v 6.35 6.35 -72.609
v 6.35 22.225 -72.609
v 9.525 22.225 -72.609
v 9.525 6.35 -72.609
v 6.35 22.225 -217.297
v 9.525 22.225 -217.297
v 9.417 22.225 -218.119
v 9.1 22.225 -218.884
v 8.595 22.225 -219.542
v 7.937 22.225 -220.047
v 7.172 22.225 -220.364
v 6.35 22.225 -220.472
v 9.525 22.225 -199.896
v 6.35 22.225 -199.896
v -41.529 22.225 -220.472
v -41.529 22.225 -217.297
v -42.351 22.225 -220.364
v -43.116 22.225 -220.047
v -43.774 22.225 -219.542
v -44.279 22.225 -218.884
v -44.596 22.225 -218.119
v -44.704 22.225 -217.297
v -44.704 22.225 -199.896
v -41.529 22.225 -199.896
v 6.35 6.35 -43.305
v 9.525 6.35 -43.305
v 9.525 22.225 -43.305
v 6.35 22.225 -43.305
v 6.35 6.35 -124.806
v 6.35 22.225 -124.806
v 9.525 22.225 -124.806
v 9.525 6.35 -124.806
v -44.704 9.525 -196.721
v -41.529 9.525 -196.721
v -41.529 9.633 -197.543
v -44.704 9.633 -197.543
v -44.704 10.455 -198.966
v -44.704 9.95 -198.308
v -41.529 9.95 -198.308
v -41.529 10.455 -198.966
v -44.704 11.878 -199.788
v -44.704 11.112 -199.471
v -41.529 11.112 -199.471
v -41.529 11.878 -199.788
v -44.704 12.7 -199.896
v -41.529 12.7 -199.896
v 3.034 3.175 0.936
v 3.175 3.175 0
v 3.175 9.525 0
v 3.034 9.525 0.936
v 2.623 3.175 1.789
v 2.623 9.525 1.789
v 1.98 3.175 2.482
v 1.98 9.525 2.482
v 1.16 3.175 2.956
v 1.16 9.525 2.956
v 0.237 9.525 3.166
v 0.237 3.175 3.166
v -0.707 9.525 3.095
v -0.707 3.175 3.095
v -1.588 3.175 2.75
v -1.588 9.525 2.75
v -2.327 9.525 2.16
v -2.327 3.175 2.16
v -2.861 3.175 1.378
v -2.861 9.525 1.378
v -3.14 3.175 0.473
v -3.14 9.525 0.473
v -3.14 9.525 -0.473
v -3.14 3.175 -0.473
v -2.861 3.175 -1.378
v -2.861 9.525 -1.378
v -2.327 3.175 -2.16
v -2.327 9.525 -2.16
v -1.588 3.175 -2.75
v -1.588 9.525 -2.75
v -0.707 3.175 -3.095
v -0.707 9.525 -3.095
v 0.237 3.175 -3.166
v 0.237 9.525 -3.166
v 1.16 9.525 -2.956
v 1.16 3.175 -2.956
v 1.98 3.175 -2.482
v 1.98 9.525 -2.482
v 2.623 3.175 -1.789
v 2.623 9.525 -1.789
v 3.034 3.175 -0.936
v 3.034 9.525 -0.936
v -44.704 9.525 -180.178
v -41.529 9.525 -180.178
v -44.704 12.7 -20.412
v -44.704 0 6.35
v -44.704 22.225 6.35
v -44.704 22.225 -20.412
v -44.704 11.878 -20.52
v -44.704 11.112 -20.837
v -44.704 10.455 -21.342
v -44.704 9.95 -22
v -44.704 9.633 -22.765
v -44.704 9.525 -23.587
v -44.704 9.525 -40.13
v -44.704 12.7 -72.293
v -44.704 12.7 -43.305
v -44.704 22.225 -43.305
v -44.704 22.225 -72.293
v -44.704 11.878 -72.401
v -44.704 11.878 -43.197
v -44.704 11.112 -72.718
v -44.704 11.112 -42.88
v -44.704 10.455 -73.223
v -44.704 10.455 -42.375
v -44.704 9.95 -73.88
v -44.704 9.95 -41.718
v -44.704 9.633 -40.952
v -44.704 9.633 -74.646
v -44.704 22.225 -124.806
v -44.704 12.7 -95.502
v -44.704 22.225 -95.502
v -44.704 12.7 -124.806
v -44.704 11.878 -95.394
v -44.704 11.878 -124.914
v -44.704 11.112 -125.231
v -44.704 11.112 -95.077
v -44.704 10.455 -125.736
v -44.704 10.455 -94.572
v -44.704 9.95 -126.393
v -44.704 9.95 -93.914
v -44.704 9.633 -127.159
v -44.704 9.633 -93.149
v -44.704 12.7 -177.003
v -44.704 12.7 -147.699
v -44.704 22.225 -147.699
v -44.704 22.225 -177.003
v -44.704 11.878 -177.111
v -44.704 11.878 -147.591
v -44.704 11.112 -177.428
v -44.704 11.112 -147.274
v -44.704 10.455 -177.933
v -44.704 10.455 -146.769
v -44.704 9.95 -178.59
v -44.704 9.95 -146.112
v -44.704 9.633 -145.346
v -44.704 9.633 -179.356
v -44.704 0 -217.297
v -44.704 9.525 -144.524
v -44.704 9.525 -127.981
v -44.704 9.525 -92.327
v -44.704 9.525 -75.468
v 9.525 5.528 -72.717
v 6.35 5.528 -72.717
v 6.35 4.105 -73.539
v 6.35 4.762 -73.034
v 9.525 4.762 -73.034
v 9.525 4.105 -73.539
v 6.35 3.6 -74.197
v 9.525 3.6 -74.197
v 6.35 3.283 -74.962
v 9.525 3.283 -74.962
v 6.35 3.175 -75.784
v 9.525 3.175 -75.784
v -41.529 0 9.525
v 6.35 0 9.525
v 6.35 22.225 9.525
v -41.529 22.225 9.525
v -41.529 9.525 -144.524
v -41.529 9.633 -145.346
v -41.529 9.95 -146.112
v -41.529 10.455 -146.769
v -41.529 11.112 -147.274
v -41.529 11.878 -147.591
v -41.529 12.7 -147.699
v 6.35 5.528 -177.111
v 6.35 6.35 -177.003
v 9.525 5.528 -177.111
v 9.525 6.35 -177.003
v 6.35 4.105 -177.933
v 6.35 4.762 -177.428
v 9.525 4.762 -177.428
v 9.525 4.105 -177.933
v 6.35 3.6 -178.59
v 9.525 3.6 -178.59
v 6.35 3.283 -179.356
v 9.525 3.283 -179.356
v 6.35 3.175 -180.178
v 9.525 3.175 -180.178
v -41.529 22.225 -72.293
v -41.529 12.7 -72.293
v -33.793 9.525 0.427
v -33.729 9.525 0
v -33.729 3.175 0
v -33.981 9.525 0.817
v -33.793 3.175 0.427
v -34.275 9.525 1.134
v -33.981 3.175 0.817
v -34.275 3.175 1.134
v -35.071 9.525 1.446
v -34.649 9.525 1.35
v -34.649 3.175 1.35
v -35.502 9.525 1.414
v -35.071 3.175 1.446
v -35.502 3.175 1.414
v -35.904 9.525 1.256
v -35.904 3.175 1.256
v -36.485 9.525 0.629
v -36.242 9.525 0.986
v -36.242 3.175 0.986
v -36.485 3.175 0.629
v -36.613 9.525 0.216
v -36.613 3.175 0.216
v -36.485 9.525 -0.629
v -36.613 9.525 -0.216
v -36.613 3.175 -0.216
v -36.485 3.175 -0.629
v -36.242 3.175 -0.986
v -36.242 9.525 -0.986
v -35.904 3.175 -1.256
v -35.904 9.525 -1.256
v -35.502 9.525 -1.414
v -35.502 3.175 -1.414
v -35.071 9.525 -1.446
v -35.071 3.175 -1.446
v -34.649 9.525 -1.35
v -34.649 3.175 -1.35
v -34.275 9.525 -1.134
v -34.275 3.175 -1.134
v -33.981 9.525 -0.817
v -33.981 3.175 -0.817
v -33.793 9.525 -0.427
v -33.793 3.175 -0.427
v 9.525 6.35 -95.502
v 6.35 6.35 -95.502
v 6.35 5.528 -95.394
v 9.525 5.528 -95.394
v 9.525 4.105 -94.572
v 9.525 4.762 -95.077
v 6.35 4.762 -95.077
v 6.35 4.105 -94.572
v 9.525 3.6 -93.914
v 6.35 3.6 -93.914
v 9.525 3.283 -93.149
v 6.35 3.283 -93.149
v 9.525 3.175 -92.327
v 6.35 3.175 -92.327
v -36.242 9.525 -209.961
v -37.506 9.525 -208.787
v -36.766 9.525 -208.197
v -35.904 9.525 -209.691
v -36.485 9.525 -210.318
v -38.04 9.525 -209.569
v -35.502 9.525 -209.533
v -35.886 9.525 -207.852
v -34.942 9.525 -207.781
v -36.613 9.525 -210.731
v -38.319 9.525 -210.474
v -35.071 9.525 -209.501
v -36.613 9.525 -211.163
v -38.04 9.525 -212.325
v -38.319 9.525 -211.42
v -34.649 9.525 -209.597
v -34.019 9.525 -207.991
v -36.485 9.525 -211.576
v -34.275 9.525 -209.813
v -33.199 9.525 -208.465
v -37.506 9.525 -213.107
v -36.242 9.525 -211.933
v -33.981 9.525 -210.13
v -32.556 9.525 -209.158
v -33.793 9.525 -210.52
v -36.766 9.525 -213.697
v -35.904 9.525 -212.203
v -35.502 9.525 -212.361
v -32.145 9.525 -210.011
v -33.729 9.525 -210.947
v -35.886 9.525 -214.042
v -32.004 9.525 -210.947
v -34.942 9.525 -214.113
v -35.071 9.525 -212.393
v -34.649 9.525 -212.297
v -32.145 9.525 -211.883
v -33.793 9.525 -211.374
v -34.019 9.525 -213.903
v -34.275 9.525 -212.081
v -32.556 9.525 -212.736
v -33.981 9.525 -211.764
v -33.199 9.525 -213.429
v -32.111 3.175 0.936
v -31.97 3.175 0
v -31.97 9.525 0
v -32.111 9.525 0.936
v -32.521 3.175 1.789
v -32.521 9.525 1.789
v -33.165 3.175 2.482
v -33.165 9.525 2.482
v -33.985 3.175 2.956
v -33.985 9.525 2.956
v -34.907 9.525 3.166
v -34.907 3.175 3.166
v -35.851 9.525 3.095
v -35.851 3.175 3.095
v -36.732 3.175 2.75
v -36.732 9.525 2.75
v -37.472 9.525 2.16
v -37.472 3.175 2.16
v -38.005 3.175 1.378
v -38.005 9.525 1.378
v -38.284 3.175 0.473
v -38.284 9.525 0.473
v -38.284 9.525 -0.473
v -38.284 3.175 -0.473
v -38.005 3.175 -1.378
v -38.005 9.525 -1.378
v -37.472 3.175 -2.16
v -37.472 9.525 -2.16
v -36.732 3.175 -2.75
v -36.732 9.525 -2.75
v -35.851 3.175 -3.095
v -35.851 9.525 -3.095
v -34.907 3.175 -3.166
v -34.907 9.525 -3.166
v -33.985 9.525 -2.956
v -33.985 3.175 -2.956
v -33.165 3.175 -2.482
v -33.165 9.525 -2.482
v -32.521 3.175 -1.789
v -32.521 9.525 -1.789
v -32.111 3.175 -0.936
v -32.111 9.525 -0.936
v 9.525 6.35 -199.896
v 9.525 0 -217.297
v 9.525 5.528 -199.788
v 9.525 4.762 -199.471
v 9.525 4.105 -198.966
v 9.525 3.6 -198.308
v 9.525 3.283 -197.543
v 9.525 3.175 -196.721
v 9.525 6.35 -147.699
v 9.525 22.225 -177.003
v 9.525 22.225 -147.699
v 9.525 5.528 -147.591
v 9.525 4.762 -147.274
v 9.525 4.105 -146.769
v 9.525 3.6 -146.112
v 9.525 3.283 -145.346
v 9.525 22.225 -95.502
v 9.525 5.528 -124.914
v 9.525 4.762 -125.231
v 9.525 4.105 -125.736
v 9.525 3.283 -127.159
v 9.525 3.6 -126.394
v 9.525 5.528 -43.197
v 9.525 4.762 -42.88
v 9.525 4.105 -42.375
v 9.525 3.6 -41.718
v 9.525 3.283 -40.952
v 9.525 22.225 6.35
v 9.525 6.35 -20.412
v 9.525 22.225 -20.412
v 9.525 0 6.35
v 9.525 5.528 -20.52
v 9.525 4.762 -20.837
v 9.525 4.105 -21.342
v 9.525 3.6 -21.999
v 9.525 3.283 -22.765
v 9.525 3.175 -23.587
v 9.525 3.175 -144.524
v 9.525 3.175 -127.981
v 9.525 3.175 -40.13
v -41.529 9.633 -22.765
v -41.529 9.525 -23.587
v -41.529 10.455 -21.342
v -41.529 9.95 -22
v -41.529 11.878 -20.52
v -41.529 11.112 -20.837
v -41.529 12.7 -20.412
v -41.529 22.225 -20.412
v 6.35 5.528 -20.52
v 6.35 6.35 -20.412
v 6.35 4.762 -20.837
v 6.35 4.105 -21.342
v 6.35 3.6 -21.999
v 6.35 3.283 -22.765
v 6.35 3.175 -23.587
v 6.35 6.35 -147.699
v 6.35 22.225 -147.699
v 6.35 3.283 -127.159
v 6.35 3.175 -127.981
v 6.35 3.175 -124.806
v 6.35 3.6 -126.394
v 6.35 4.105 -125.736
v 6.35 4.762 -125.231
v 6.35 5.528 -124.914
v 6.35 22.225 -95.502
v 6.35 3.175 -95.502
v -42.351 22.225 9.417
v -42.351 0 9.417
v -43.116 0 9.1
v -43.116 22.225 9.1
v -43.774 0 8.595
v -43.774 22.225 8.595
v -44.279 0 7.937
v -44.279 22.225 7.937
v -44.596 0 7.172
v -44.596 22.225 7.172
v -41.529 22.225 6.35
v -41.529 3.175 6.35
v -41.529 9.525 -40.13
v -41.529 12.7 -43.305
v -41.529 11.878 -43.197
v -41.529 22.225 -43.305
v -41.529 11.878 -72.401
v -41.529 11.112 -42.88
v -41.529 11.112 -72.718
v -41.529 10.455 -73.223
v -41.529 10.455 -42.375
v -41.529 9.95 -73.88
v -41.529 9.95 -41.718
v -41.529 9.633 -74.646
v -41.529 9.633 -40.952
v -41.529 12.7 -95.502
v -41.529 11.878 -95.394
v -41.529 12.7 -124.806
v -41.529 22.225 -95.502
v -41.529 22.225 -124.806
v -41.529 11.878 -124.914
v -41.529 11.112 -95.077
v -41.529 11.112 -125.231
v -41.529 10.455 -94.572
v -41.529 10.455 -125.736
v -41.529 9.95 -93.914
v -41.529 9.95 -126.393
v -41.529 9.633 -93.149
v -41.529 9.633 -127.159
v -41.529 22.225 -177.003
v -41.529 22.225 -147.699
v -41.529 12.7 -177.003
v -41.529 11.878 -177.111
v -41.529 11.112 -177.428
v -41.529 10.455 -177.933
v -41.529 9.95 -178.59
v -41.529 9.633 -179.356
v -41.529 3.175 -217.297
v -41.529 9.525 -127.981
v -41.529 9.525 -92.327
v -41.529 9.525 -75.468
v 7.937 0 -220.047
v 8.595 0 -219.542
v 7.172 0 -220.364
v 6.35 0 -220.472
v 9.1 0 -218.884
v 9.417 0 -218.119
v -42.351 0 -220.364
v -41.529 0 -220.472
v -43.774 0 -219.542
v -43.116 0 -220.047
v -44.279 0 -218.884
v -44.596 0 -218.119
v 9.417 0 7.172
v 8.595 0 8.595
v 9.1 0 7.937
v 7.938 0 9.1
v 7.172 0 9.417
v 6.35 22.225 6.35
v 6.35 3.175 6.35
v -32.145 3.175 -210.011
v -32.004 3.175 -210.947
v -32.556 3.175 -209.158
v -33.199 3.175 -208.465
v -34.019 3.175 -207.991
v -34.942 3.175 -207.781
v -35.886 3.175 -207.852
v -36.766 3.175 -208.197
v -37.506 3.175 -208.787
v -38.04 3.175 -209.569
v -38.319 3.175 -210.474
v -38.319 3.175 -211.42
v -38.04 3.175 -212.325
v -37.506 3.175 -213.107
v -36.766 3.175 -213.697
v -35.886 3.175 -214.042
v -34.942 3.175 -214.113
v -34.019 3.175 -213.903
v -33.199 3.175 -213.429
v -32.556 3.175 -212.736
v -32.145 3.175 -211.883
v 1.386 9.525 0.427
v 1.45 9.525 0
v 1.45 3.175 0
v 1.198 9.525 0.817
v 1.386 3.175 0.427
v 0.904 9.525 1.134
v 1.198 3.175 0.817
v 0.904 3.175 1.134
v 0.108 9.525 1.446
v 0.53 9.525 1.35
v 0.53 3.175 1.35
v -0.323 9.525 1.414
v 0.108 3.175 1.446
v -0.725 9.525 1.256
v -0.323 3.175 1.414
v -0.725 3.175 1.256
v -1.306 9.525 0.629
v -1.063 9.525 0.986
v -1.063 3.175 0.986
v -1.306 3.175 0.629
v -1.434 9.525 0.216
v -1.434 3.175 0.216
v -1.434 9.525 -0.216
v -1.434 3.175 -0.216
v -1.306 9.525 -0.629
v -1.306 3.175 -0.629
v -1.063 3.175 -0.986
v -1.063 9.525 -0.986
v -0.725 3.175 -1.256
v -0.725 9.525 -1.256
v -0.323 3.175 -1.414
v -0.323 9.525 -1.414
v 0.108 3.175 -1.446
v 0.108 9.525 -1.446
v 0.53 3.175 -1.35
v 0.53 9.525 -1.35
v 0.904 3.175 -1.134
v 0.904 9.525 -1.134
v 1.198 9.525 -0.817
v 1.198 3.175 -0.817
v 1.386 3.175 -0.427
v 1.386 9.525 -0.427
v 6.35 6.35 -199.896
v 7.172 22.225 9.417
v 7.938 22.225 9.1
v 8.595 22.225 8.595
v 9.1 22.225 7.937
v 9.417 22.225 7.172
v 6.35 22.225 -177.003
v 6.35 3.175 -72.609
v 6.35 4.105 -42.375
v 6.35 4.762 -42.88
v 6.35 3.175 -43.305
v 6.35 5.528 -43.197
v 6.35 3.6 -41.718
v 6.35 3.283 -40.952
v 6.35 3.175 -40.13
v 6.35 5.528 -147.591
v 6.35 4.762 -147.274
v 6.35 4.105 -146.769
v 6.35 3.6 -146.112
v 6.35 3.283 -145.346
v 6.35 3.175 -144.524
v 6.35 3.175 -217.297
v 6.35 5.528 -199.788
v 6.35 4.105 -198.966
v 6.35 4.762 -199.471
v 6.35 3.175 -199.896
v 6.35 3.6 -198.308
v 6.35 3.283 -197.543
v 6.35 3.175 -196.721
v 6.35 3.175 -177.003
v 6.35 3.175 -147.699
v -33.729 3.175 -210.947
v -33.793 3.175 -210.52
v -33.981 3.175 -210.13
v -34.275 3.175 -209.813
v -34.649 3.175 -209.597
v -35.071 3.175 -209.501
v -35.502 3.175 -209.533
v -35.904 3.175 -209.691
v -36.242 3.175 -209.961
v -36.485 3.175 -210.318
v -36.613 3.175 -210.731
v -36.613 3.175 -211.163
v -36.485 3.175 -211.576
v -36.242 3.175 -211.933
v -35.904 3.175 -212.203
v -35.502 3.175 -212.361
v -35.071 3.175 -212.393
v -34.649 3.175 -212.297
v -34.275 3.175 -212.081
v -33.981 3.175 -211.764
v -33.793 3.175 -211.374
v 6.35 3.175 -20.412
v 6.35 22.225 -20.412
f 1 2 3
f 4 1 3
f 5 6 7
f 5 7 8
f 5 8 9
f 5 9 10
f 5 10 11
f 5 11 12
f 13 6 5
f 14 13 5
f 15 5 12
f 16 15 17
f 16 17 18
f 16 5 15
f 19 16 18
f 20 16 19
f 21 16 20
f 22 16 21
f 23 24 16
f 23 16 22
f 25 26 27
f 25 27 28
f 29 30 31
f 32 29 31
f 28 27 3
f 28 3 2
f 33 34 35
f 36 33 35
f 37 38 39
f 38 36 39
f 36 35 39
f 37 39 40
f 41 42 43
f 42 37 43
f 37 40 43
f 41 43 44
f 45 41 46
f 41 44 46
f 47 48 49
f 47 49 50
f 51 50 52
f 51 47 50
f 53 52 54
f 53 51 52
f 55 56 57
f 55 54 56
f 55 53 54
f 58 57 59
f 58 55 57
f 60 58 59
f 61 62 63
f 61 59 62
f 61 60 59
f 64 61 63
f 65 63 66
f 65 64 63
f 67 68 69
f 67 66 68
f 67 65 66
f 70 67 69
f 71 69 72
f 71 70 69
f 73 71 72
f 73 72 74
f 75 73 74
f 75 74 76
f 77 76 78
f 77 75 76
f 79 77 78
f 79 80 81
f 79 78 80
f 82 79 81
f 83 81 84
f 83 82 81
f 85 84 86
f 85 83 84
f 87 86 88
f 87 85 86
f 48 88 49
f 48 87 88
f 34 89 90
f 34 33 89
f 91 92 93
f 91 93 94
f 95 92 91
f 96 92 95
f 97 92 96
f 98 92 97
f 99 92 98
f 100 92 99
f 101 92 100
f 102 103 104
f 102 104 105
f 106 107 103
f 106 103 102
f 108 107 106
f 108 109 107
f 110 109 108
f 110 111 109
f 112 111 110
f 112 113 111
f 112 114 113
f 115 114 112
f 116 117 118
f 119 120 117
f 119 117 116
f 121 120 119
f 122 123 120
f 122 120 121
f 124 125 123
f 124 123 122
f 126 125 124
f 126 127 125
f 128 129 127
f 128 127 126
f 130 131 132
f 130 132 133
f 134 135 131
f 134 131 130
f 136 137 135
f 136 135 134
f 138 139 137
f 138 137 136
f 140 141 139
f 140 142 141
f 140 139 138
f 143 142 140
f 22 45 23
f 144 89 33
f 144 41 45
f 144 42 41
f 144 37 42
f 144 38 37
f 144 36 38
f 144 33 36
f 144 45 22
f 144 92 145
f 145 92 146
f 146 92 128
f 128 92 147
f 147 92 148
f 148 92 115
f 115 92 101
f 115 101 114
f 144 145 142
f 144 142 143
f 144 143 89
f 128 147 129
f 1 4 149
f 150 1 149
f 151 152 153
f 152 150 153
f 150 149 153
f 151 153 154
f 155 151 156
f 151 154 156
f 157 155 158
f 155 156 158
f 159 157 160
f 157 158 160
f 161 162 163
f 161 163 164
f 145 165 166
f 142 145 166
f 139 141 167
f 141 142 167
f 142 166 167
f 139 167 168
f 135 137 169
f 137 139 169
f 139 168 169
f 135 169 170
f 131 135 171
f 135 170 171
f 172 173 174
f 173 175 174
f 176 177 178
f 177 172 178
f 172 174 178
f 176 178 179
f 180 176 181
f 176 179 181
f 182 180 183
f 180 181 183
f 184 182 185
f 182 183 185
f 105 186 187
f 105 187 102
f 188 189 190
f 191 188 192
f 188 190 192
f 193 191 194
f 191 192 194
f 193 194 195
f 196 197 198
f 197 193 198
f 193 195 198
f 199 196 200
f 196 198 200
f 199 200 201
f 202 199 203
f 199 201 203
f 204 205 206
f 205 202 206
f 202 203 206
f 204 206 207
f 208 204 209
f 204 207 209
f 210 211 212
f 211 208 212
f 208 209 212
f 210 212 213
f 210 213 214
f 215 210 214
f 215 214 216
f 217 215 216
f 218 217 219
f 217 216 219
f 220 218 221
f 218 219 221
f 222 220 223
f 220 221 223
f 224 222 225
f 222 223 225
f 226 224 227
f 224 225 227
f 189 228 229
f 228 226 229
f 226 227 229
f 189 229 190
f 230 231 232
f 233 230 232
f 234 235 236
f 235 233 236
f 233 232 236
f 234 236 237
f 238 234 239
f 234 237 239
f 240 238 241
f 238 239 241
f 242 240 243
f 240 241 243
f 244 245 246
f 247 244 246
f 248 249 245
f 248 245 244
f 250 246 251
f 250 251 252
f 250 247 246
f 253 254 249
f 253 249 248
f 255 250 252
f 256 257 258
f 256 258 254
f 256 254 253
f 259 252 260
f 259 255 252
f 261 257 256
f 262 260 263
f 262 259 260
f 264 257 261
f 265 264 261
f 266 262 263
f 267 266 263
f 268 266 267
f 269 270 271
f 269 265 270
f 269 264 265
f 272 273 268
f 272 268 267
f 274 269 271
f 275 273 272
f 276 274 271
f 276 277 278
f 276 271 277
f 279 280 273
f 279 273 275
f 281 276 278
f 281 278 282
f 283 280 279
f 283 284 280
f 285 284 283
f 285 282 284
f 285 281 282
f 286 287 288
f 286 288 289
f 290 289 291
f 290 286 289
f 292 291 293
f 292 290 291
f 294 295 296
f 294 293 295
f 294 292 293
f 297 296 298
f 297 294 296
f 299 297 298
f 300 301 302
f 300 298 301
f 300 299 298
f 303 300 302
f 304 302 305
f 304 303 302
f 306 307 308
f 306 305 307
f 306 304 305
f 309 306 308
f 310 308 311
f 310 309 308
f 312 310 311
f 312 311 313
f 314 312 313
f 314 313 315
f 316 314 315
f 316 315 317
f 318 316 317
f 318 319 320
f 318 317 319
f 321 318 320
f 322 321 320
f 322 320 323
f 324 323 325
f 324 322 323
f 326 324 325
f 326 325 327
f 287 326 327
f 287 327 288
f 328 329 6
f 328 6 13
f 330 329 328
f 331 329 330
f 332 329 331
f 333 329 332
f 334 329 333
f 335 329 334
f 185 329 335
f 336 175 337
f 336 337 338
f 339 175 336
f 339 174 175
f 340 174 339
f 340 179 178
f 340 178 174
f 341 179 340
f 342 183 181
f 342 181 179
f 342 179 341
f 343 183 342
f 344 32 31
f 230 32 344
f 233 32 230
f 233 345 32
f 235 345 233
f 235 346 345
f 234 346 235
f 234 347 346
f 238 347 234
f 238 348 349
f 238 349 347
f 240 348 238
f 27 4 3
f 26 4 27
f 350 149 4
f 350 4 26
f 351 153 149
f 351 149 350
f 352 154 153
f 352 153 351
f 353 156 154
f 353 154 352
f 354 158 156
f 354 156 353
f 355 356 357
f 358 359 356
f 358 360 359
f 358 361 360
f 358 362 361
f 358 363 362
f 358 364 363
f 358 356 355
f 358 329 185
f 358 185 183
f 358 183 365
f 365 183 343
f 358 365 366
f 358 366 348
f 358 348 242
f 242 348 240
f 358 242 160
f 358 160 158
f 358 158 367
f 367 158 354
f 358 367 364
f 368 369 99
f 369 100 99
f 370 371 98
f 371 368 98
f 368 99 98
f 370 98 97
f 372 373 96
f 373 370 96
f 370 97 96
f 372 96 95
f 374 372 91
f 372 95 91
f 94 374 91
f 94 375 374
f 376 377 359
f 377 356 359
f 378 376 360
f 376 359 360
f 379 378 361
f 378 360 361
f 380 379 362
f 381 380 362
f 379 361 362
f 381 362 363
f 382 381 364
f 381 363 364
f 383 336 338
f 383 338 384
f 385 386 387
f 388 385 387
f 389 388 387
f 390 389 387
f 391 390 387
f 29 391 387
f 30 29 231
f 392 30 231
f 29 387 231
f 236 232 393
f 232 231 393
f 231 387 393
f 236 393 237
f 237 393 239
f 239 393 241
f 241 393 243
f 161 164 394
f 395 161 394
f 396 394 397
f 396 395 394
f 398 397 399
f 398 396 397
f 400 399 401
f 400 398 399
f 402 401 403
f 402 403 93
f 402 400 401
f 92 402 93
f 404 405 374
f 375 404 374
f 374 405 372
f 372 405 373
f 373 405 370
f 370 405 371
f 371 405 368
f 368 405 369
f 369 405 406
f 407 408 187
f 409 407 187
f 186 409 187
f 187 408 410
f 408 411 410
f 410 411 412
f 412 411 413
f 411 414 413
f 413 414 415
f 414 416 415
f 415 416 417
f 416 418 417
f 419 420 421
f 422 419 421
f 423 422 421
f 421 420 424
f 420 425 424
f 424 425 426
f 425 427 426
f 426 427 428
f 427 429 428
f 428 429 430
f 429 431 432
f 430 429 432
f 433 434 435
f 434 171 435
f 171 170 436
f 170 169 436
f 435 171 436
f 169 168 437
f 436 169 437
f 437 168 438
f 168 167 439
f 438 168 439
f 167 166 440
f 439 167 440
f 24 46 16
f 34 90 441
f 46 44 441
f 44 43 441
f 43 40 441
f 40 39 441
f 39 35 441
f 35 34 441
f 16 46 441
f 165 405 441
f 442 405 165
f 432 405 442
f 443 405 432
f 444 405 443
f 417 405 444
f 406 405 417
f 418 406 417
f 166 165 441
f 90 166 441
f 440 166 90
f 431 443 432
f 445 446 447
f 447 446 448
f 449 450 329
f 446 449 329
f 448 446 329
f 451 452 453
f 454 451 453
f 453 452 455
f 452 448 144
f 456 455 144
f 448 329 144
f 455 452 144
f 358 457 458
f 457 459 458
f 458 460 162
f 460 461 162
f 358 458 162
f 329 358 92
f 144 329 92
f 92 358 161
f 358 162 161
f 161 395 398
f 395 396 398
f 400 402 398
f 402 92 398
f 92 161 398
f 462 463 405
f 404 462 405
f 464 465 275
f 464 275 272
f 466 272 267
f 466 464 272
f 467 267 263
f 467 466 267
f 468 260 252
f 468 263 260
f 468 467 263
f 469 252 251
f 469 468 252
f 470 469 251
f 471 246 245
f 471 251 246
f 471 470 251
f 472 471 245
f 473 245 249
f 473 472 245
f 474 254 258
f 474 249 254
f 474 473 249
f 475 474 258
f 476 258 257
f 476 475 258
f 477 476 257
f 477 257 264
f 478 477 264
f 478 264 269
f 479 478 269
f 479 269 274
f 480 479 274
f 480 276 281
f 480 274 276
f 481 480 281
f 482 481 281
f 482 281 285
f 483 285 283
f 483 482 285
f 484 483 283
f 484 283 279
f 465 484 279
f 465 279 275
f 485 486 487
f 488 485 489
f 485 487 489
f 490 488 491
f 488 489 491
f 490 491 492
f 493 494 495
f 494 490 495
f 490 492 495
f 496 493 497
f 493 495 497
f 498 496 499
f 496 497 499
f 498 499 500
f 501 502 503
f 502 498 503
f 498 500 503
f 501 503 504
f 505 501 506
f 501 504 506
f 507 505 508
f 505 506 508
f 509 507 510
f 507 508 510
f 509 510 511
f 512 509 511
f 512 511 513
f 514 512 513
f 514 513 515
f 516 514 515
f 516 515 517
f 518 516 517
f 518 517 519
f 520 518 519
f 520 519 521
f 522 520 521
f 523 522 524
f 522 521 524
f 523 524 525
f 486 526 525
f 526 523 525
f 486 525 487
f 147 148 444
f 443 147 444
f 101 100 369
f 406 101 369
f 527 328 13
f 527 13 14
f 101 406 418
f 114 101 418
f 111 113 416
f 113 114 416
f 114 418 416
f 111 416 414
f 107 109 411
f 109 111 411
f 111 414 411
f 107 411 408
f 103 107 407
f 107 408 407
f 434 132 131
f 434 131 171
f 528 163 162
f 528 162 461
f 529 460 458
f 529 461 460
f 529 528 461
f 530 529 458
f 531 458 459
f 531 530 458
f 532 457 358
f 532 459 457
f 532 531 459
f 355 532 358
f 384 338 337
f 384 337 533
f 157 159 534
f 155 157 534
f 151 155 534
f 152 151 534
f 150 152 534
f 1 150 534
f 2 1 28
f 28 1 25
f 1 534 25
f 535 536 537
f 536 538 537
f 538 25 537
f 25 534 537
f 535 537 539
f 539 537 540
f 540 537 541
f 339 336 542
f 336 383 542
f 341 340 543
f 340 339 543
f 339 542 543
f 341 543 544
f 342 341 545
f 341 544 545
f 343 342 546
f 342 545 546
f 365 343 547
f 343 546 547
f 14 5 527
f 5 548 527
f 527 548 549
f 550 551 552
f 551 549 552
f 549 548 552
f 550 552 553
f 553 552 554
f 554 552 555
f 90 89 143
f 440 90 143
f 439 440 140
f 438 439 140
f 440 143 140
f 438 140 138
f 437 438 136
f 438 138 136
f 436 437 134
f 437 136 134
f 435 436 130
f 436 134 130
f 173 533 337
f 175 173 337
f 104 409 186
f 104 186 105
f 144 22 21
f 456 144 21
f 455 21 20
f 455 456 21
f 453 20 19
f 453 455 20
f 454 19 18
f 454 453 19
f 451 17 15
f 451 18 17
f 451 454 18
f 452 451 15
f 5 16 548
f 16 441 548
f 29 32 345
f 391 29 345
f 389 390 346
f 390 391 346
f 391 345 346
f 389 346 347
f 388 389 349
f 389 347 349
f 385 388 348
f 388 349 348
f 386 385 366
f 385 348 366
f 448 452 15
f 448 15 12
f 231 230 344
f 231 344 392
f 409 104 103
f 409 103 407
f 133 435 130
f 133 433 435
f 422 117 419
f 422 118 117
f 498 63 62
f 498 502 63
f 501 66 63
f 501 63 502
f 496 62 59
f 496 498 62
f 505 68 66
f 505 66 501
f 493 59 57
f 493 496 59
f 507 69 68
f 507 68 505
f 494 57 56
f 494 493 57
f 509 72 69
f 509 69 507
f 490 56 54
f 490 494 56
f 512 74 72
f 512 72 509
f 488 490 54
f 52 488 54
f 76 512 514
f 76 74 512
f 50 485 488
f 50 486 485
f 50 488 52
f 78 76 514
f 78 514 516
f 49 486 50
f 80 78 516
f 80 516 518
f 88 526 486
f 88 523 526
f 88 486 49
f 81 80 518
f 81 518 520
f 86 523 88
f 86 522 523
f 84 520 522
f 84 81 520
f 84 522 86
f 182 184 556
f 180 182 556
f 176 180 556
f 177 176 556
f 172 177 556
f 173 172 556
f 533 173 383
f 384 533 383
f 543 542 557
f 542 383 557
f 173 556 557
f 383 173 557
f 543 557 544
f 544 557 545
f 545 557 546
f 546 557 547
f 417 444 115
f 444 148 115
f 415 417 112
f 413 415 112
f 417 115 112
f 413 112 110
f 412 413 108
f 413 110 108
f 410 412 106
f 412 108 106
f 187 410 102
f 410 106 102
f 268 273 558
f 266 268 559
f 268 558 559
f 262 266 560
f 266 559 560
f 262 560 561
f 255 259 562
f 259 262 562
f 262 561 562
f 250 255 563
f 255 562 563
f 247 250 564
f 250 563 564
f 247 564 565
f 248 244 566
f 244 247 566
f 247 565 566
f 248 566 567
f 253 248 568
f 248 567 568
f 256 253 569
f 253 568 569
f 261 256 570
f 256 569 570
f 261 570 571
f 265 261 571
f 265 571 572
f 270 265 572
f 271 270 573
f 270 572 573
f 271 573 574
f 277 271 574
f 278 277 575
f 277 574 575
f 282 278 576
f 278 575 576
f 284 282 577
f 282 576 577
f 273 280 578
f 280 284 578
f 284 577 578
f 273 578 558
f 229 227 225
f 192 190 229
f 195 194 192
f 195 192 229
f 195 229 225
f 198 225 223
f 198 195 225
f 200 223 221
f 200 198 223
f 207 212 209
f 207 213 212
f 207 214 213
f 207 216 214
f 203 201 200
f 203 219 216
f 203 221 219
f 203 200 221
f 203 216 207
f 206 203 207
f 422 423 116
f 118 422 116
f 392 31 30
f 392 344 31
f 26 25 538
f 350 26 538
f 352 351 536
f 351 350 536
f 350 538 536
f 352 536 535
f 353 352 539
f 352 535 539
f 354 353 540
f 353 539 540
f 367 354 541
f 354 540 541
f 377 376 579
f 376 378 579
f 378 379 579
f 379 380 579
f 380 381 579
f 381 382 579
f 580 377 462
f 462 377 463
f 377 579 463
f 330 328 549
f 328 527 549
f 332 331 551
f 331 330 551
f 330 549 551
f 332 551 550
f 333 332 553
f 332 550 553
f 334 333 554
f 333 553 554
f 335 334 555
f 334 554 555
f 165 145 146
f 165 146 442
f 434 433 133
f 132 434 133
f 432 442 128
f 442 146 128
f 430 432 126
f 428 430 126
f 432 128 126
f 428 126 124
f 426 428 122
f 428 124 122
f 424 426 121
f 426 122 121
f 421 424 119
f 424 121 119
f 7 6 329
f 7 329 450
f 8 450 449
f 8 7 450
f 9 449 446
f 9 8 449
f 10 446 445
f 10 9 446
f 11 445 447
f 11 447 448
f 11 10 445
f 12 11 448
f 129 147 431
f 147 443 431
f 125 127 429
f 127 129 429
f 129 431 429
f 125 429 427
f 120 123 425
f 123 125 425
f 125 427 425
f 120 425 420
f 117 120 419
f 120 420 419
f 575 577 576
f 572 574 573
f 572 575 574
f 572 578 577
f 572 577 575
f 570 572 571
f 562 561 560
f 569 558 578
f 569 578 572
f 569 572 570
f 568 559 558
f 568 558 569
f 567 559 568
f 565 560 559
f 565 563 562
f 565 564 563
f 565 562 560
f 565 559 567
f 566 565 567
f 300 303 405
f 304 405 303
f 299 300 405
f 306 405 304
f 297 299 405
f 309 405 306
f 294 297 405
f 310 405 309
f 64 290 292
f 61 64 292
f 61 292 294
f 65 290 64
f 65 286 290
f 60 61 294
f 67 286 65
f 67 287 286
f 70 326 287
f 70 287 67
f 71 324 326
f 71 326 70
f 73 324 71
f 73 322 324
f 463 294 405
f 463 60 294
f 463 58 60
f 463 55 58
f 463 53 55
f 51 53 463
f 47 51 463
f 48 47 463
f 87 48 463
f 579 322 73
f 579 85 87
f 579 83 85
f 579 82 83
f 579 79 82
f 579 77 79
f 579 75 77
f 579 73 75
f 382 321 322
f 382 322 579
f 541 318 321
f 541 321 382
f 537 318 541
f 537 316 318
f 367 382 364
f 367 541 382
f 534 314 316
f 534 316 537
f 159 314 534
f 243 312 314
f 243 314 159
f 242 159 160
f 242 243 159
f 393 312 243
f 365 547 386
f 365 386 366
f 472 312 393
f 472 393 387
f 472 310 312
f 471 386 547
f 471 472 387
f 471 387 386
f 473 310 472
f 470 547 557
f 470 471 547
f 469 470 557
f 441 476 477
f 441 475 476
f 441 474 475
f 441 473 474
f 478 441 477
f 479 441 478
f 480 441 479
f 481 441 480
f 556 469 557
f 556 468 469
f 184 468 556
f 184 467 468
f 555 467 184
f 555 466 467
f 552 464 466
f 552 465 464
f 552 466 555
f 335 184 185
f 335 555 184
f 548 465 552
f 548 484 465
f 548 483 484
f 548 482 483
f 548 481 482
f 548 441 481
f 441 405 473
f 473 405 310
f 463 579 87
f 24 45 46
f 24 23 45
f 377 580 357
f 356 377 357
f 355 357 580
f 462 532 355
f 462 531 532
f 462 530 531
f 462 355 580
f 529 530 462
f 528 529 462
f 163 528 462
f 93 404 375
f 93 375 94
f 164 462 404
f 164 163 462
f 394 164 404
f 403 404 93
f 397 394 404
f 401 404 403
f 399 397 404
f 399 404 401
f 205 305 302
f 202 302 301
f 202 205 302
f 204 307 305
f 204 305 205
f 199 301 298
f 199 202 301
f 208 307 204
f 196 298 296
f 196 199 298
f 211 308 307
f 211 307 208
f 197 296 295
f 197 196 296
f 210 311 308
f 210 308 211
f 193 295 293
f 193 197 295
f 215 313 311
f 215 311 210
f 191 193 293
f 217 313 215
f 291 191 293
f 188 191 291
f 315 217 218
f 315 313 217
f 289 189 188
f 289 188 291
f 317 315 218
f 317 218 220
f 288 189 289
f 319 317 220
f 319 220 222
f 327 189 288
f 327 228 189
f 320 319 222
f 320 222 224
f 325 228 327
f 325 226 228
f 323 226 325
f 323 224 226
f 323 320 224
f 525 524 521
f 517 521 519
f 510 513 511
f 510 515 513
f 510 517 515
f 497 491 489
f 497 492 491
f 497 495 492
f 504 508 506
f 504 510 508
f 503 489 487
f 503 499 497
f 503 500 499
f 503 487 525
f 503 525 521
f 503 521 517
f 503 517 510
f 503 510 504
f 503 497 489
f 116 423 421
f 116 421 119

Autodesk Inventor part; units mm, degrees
ref_plane "YZ Plane" through (0, 0, 0) normal (1, 0, 0) x (0, 1, 0)
ref_plane "XZ Plane" through (0, 0, 0) normal (0, 1, 0) x (-1, 0, 0)
ref_plane "XY Plane" through (0, 0, 0) normal (0, 0, 1) x (1, 0, 0)
sketch "Sketch1" plane through (0, 0, 0) normal (0, 1, 0) x (-1, 0, 0)
  line L0 (0, 0) -> (35.179, 0)
  line L1 (35.179, 0) -> (35.179, -210.947)
  line L2 (35.179, -210.947) -> (0, -210.947)
  line L3 (0, -210.947) -> (0, 0)
  circle A0 centre (35.179, 0) radius 1.45
  circle A1 centre (0, 0) radius 1.45
  circle A2 centre (35.179, -210.947) radius 1.45
  line L4 (-6.35, 6.35) -> (41.529, 6.35)
  line L5 (41.529, 6.35) -> (41.529, -217.297)
  line L6 (41.529, -217.297) -> (-6.35, -217.297)
  line L7 (-6.35, -217.297) -> (-6.35, 6.35)
  line L8 (-6.35, 6.35) -> (41.529, -217.297) construction
  line L9 (41.529, 6.35) -> (-6.35, -217.297) construction
  line L10 (28.829, -204.597) -> (41.529, -204.597)
  line L11 (41.529, -204.597) -> (41.529, -217.297)
  line L12 (41.529, -217.297) -> (28.829, -217.297)
  line L13 (28.829, -217.297) -> (28.829, -204.597)
  line L14 (28.829, -204.597) -> (41.529, -217.297) construction
  line L15 (41.529, -204.597) -> (28.829, -217.297) construction
  line L16 (-9.525, 9.525) -> (44.704, 9.525)
  line L17 (44.704, 9.525) -> (44.704, -220.472)
  line L18 (44.704, -220.472) -> (-9.525, -220.472)
  line L19 (-9.525, -220.472) -> (-9.525, 9.525)
  line L20 (-9.525, 9.525) -> (44.704, -220.472) construction
  line L21 (44.704, 9.525) -> (-9.525, -220.472) construction
  point P0 (17.5895, -105.4735)
  point P1 (17.5895, -105.4735)
  dimension "d0" = 35.179
  dimension "d1" = 210.947
  dimension "d2" = 2.9
  dimension "d3" = 2.9
  dimension "d4" = 2.9
  dimension "d6" = 12.7
  dimension "d7" = 12.7
  dimension "d8" = 3.175
  dimension "d9" = 3.175
extrude "Extrusion1" add sketch "Sketch1" along normal blind 3.175 contours A1 L3 L2 L13 L6 L7 L4 L5 L10 L1 A0 L0 | L0 A0 L1 L10 L13 L2 L3 A1 | L13 L10 L1 A2 L2 | L2 A2 L1 L10 L5 L6 L13 | L16 L17 L18 L19
extrude "Extrusion2" add sketch "Sketch1" along normal blind 22.225
sketch "Sketch2" plane through (0, 3.175, 0) normal (0, 1, 0) x (1, 0, 0)
  circle A0 centre (-35.1446, 0) radius 3.175
  circle A1 centre (0, 0) radius 3.175
  circle A2 centre (-35.179, 0) radius 1.45 projected
  circle A3 centre (0, 0) radius 1.45 projected
  circle A4 centre (-35.179, 210.947) radius 1.45 projected
  circle A5 centre (-35.179, 210.947) radius 3.175
  point P0 (0, 210.947)
  dimension "d14" = 6.35
  dimension "d15" = 6.35
  dimension "d20" = 6.35
extrude "Extrusion3" add sketch "Sketch2" along normal blind 6.35
extrude "Extrusion4" add sketch "Sketch1" along normal blind 3.175 contours L3 A1 L0 | L0 A1 L3 | A0 L1 L0 | L0 L1 A0 | A2 L1 L2 | L2 L1 A2
sketch "Sketch3" plane through (0, 22.225, 0) normal (0, 1, 0) x (1, 0, 0)
  circle A0 centre (-25.011, 12.319) radius 6.5
  circle A1 centre (-25.011, 50.292) radius 6.5
  circle A2 centre (-25.011, 64.516) radius 6.5
  circle A3 centre (-25.011, 102.489) radius 6.5
  circle A4 centre (-25.011, 116.713) radius 6.5
  circle A5 centre (-25.011, 154.686) radius 6.5
  circle A6 centre (-25.011, 168.91) radius 6.5
  circle A7 centre (-25.011, 206.883) radius 6.5
  line L0 (-9.707, 199.896) -> (-9.707, 209.896)
  line L1 (-9.707, 209.896) -> (2.293, 209.896)
  line L2 (2.293, 209.896) -> (2.293, 199.896)
  line L3 (2.293, 199.896) -> (-9.707, 199.896)
  line L4 (-9.707, 177.003) -> (2.293, 177.003)
  line L5 (-9.707, 167.003) -> (-9.707, 177.003)
  line L6 (2.293, 167.003) -> (-9.707, 167.003)
  line L7 (2.293, 177.003) -> (2.293, 167.003)
  line L8 (2.293, 157.699) -> (2.293, 147.699)
  line L9 (-9.707, 157.699) -> (2.293, 157.699)
  line L10 (2.293, 147.699) -> (-9.707, 147.699)
  line L11 (-9.707, 147.699) -> (-9.707, 157.699)
  line L12 (-9.707, 124.806) -> (2.293, 124.806)
  line L13 (-9.707, 114.806) -> (-9.707, 124.806)
  line L14 (2.293, 114.806) -> (-9.707, 114.806)
  line L15 (2.293, 124.806) -> (2.293, 114.806)
  line L16 (-9.707, 105.502) -> (2.293, 105.502)
  line L17 (2.293, 105.502) -> (2.293, 95.502)
  line L18 (-9.707, 95.502) -> (-9.707, 105.502)
  line L19 (2.293, 95.502) -> (-9.707, 95.502)
  line L20 (-9.707, 72.609) -> (2.293, 72.609)
  line L21 (-9.707, 62.609) -> (-9.707, 72.609)
  line L22 (2.293, 62.609) -> (-9.707, 62.609)
  line L23 (2.293, 72.609) -> (2.293, 62.609)
  line L24 (-9.707, 53.305) -> (2.293, 53.305)
  line L25 (-9.707, 43.305) -> (-9.707, 53.305)
  line L26 (2.293, 43.305) -> (-9.707, 43.305)
  line L27 (2.293, 53.305) -> (2.293, 43.305)
  line L28 (-9.707, 20.412) -> (2.293, 20.412)
  line L29 (2.293, 20.412) -> (2.293, 10.412)
  line L30 (2.293, 10.412) -> (-9.707, 10.412)
  line L31 (-9.707, 10.412) -> (-9.707, 20.412)
  line L32 (-17.686, -1.671) -> (-20.286, -1.671)
  line L33 (-23.811, 2.214) -> (-23.811, 0.214)
  line L34 (-14.161, 2.214) -> (-14.161, 0.214)
  line L35 (-18.511, 3.894) -> (-17.511, 3.894)
  line L36 (-20.461, 3.894) -> (-19.461, 3.894)
  line L37 (-35.859, 30.096) -> (-35.859, 20.096)
  line L38 (-35.859, 42.669) -> (-35.859, 32.669)
  line L39 (-35.859, 82.293) -> (-35.859, 72.293)
  line L40 (-35.859, 94.866) -> (-35.859, 84.866)
  line L41 (-35.859, 134.49) -> (-35.859, 124.49)
  line L42 (-35.859, 147.063) -> (-35.859, 137.063)
  line L43 (-35.859, 186.687) -> (-35.859, 176.687)
  line L44 (-35.859, 199.26) -> (-35.859, 189.26)
  line L45 (-17.0795, 187.3678) -> (-17.0795, 189.3599)
  line L46 (-13.5395, 185.2639) -> (-17.0795, 185.2639)
  line L47 (-17.0795, 191.4639) -> (-13.5395, 191.4639)
  line L48 (-13.5395, 191.4639) -> (-13.5395, 185.2639)
  line L49 (-13.5395, 139.2668) -> (-13.5395, 133.0668)
  line L50 (-17.0795, 139.2668) -> (-13.5395, 139.2668)
  line L51 (-17.0795, 135.1708) -> (-17.0795, 137.1629)
  line L52 (-13.5395, 133.0668) -> (-17.0795, 133.0668)
  line L53 (-13.5395, 87.0699) -> (-13.5395, 80.8699)
  line L54 (-13.5395, 80.8699) -> (-17.0795, 80.8699)
  line L55 (-17.0795, 87.0699) -> (-13.5395, 87.0699)
  line L56 (-17.0795, 82.9738) -> (-17.0795, 84.9659)
  line L57 (-17.0795, 30.7768) -> (-17.0795, 32.7689)
  line L58 (-13.5395, 28.6728) -> (-17.0795, 28.6728)
  line L59 (-17.0795, 34.8728) -> (-13.5395, 34.8728)
  line L60 (-13.5395, 34.8728) -> (-13.5395, 28.6728)
  line L61 (3.1921, 139.1709) -> (3.1921, 133.1709)
  line L62 (3.1921, 86.9739) -> (3.1921, 80.9739)
  line L63 (3.1921, 34.7769) -> (3.1921, 28.7769)
  line L64 (3.1921, 191.3679) -> (3.1921, 185.3679)
  circle A8 centre (-35.179, 0) radius 1.702
  circle A9 centre (0, 0) radius 1.702
  circle A10 centre (-35.179, 210.947) radius 1.702
  line L65 (9.525, 220.472) -> (-44.704, 220.472) projected
  line L66 (-44.704, 220.472) -> (-44.704, -9.525) projected
  line L67 (-44.704, -9.525) -> (9.525, -9.525) projected
  line L68 (9.525, -9.525) -> (9.525, 220.472) projected
  line L69 (6.35, -6.35) -> (-41.529, -6.35) projected
  line L70 (-41.529, -6.35) -> (-41.529, 217.297) projected
  line L71 (-41.529, 217.297) -> (6.35, 217.297) projected
  line L72 (6.35, 217.297) -> (6.35, -6.35) projected
  line L73 (9.525, -9.525) -> (9.525, 220.472) projected
  line L74 (6.35, 20.412) -> (9.525, 20.412)
  line L75 (9.525, 20.412) -> (9.525, 43.305)
  line L76 (9.525, 43.305) -> (6.35, 43.305)
  line L77 (6.35, 43.305) -> (6.35, 20.412)
  line L78 (6.35, 217.297) -> (6.35, -6.35) projected
  line L79 (6.35, 72.609) -> (9.525, 72.609)
  line L80 (9.525, 72.609) -> (9.525, 95.502)
  line L81 (9.525, 95.502) -> (6.35, 95.502)
  line L82 (6.35, 95.502) -> (6.35, 72.609)
  line L83 (6.35, 124.806) -> (9.525, 124.806)
  line L84 (9.525, 124.806) -> (9.525, 147.699)
  line L85 (9.525, 147.699) -> (6.35, 147.699)
  line L86 (6.35, 147.699) -> (6.35, 124.806)
  line L87 (6.35, 177.003) -> (9.525, 177.003)
  line L88 (9.525, 177.003) -> (9.525, 199.896)
  line L89 (9.525, 199.896) -> (6.35, 199.896)
  line L90 (6.35, 199.896) -> (6.35, 177.003)
  line L91 (-41.529, 217.297) -> (-41.529, -6.35) projected
  line L92 (-44.704, 220.472) -> (-44.704, -9.525) projected
  line L93 (-41.529, 20.412) -> (-44.704, 20.412)
  line L94 (-44.704, 20.412) -> (-44.704, 43.305)
  line L95 (-44.704, 43.305) -> (-41.529, 43.305)
  line L96 (-41.529, 43.305) -> (-41.529, 20.412)
  line L97 (-41.529, 72.293) -> (-44.704, 72.293)
  line L98 (-44.704, 72.293) -> (-44.704, 95.502)
  line L99 (-44.704, 95.502) -> (-41.529, 95.502)
  line L100 (-41.529, 95.502) -> (-41.529, 72.293)
  line L101 (-41.529, 124.806) -> (-44.704, 124.806)
  line L102 (-44.704, 124.806) -> (-44.704, 147.699)
  line L103 (-44.704, 147.699) -> (-41.529, 147.699)
  line L104 (-41.529, 147.699) -> (-41.529, 124.806)
  line L105 (-41.529, 177.003) -> (-44.704, 177.003)
  line L106 (-44.704, 177.003) -> (-44.704, 199.896)
  line L107 (-44.704, 199.896) -> (-41.529, 199.896)
  line L108 (-41.529, 199.896) -> (-41.529, 177.003)
  point P0 (0, 0)
extrude "Extrusion5" cut sketch "Sketch3" against normal blind 12.7 contours L107 L70 L105 L66 | L103 L70 L101 L66 | L99 L70 L97 L66 | L95 L70 L93 L66
extrude "Extrusion6" cut sketch "Sketch3" against normal up to surface (19.05 mm away) contours L68 L87 L72 L89 | L68 L83 L72 L85 | L68 L79 L72 L81 | L68 L74 L72 L76
fillet "Fillet1" radius 3.175 16 edges at (7.9375, 3.175, -20.412) (7.9375, 3.175, -43.305) (7.9375, 3.175, -72.609) (7.9375, 3.175, -95.502) (7.9375, 3.175, -124.806) (7.9375, 3.175, -147.699) (7.9375, 3.175, -199.896) (7.9375, 3.175, -177.003) (-43.1165, 9.525, -20.412) (-43.1165, 9.525, -43.305) (-43.1165, 9.525, -95.502) (-43.1165, 9.525, -147.699) (-43.1165, 9.525, -199.896) (-43.1165, 9.525, -72.293) (-43.1165, 9.525, -124.806) (-43.1165, 9.525, -177.003)
fillet "Fillet2" radius 3.175 4 edges at (9.525, 11.1125, 9.525) (9.525, 11.1125, -220.472) (-44.704, 11.1125, -220.472) (-44.704, 11.1125, 9.525)
properties part number "Box"
